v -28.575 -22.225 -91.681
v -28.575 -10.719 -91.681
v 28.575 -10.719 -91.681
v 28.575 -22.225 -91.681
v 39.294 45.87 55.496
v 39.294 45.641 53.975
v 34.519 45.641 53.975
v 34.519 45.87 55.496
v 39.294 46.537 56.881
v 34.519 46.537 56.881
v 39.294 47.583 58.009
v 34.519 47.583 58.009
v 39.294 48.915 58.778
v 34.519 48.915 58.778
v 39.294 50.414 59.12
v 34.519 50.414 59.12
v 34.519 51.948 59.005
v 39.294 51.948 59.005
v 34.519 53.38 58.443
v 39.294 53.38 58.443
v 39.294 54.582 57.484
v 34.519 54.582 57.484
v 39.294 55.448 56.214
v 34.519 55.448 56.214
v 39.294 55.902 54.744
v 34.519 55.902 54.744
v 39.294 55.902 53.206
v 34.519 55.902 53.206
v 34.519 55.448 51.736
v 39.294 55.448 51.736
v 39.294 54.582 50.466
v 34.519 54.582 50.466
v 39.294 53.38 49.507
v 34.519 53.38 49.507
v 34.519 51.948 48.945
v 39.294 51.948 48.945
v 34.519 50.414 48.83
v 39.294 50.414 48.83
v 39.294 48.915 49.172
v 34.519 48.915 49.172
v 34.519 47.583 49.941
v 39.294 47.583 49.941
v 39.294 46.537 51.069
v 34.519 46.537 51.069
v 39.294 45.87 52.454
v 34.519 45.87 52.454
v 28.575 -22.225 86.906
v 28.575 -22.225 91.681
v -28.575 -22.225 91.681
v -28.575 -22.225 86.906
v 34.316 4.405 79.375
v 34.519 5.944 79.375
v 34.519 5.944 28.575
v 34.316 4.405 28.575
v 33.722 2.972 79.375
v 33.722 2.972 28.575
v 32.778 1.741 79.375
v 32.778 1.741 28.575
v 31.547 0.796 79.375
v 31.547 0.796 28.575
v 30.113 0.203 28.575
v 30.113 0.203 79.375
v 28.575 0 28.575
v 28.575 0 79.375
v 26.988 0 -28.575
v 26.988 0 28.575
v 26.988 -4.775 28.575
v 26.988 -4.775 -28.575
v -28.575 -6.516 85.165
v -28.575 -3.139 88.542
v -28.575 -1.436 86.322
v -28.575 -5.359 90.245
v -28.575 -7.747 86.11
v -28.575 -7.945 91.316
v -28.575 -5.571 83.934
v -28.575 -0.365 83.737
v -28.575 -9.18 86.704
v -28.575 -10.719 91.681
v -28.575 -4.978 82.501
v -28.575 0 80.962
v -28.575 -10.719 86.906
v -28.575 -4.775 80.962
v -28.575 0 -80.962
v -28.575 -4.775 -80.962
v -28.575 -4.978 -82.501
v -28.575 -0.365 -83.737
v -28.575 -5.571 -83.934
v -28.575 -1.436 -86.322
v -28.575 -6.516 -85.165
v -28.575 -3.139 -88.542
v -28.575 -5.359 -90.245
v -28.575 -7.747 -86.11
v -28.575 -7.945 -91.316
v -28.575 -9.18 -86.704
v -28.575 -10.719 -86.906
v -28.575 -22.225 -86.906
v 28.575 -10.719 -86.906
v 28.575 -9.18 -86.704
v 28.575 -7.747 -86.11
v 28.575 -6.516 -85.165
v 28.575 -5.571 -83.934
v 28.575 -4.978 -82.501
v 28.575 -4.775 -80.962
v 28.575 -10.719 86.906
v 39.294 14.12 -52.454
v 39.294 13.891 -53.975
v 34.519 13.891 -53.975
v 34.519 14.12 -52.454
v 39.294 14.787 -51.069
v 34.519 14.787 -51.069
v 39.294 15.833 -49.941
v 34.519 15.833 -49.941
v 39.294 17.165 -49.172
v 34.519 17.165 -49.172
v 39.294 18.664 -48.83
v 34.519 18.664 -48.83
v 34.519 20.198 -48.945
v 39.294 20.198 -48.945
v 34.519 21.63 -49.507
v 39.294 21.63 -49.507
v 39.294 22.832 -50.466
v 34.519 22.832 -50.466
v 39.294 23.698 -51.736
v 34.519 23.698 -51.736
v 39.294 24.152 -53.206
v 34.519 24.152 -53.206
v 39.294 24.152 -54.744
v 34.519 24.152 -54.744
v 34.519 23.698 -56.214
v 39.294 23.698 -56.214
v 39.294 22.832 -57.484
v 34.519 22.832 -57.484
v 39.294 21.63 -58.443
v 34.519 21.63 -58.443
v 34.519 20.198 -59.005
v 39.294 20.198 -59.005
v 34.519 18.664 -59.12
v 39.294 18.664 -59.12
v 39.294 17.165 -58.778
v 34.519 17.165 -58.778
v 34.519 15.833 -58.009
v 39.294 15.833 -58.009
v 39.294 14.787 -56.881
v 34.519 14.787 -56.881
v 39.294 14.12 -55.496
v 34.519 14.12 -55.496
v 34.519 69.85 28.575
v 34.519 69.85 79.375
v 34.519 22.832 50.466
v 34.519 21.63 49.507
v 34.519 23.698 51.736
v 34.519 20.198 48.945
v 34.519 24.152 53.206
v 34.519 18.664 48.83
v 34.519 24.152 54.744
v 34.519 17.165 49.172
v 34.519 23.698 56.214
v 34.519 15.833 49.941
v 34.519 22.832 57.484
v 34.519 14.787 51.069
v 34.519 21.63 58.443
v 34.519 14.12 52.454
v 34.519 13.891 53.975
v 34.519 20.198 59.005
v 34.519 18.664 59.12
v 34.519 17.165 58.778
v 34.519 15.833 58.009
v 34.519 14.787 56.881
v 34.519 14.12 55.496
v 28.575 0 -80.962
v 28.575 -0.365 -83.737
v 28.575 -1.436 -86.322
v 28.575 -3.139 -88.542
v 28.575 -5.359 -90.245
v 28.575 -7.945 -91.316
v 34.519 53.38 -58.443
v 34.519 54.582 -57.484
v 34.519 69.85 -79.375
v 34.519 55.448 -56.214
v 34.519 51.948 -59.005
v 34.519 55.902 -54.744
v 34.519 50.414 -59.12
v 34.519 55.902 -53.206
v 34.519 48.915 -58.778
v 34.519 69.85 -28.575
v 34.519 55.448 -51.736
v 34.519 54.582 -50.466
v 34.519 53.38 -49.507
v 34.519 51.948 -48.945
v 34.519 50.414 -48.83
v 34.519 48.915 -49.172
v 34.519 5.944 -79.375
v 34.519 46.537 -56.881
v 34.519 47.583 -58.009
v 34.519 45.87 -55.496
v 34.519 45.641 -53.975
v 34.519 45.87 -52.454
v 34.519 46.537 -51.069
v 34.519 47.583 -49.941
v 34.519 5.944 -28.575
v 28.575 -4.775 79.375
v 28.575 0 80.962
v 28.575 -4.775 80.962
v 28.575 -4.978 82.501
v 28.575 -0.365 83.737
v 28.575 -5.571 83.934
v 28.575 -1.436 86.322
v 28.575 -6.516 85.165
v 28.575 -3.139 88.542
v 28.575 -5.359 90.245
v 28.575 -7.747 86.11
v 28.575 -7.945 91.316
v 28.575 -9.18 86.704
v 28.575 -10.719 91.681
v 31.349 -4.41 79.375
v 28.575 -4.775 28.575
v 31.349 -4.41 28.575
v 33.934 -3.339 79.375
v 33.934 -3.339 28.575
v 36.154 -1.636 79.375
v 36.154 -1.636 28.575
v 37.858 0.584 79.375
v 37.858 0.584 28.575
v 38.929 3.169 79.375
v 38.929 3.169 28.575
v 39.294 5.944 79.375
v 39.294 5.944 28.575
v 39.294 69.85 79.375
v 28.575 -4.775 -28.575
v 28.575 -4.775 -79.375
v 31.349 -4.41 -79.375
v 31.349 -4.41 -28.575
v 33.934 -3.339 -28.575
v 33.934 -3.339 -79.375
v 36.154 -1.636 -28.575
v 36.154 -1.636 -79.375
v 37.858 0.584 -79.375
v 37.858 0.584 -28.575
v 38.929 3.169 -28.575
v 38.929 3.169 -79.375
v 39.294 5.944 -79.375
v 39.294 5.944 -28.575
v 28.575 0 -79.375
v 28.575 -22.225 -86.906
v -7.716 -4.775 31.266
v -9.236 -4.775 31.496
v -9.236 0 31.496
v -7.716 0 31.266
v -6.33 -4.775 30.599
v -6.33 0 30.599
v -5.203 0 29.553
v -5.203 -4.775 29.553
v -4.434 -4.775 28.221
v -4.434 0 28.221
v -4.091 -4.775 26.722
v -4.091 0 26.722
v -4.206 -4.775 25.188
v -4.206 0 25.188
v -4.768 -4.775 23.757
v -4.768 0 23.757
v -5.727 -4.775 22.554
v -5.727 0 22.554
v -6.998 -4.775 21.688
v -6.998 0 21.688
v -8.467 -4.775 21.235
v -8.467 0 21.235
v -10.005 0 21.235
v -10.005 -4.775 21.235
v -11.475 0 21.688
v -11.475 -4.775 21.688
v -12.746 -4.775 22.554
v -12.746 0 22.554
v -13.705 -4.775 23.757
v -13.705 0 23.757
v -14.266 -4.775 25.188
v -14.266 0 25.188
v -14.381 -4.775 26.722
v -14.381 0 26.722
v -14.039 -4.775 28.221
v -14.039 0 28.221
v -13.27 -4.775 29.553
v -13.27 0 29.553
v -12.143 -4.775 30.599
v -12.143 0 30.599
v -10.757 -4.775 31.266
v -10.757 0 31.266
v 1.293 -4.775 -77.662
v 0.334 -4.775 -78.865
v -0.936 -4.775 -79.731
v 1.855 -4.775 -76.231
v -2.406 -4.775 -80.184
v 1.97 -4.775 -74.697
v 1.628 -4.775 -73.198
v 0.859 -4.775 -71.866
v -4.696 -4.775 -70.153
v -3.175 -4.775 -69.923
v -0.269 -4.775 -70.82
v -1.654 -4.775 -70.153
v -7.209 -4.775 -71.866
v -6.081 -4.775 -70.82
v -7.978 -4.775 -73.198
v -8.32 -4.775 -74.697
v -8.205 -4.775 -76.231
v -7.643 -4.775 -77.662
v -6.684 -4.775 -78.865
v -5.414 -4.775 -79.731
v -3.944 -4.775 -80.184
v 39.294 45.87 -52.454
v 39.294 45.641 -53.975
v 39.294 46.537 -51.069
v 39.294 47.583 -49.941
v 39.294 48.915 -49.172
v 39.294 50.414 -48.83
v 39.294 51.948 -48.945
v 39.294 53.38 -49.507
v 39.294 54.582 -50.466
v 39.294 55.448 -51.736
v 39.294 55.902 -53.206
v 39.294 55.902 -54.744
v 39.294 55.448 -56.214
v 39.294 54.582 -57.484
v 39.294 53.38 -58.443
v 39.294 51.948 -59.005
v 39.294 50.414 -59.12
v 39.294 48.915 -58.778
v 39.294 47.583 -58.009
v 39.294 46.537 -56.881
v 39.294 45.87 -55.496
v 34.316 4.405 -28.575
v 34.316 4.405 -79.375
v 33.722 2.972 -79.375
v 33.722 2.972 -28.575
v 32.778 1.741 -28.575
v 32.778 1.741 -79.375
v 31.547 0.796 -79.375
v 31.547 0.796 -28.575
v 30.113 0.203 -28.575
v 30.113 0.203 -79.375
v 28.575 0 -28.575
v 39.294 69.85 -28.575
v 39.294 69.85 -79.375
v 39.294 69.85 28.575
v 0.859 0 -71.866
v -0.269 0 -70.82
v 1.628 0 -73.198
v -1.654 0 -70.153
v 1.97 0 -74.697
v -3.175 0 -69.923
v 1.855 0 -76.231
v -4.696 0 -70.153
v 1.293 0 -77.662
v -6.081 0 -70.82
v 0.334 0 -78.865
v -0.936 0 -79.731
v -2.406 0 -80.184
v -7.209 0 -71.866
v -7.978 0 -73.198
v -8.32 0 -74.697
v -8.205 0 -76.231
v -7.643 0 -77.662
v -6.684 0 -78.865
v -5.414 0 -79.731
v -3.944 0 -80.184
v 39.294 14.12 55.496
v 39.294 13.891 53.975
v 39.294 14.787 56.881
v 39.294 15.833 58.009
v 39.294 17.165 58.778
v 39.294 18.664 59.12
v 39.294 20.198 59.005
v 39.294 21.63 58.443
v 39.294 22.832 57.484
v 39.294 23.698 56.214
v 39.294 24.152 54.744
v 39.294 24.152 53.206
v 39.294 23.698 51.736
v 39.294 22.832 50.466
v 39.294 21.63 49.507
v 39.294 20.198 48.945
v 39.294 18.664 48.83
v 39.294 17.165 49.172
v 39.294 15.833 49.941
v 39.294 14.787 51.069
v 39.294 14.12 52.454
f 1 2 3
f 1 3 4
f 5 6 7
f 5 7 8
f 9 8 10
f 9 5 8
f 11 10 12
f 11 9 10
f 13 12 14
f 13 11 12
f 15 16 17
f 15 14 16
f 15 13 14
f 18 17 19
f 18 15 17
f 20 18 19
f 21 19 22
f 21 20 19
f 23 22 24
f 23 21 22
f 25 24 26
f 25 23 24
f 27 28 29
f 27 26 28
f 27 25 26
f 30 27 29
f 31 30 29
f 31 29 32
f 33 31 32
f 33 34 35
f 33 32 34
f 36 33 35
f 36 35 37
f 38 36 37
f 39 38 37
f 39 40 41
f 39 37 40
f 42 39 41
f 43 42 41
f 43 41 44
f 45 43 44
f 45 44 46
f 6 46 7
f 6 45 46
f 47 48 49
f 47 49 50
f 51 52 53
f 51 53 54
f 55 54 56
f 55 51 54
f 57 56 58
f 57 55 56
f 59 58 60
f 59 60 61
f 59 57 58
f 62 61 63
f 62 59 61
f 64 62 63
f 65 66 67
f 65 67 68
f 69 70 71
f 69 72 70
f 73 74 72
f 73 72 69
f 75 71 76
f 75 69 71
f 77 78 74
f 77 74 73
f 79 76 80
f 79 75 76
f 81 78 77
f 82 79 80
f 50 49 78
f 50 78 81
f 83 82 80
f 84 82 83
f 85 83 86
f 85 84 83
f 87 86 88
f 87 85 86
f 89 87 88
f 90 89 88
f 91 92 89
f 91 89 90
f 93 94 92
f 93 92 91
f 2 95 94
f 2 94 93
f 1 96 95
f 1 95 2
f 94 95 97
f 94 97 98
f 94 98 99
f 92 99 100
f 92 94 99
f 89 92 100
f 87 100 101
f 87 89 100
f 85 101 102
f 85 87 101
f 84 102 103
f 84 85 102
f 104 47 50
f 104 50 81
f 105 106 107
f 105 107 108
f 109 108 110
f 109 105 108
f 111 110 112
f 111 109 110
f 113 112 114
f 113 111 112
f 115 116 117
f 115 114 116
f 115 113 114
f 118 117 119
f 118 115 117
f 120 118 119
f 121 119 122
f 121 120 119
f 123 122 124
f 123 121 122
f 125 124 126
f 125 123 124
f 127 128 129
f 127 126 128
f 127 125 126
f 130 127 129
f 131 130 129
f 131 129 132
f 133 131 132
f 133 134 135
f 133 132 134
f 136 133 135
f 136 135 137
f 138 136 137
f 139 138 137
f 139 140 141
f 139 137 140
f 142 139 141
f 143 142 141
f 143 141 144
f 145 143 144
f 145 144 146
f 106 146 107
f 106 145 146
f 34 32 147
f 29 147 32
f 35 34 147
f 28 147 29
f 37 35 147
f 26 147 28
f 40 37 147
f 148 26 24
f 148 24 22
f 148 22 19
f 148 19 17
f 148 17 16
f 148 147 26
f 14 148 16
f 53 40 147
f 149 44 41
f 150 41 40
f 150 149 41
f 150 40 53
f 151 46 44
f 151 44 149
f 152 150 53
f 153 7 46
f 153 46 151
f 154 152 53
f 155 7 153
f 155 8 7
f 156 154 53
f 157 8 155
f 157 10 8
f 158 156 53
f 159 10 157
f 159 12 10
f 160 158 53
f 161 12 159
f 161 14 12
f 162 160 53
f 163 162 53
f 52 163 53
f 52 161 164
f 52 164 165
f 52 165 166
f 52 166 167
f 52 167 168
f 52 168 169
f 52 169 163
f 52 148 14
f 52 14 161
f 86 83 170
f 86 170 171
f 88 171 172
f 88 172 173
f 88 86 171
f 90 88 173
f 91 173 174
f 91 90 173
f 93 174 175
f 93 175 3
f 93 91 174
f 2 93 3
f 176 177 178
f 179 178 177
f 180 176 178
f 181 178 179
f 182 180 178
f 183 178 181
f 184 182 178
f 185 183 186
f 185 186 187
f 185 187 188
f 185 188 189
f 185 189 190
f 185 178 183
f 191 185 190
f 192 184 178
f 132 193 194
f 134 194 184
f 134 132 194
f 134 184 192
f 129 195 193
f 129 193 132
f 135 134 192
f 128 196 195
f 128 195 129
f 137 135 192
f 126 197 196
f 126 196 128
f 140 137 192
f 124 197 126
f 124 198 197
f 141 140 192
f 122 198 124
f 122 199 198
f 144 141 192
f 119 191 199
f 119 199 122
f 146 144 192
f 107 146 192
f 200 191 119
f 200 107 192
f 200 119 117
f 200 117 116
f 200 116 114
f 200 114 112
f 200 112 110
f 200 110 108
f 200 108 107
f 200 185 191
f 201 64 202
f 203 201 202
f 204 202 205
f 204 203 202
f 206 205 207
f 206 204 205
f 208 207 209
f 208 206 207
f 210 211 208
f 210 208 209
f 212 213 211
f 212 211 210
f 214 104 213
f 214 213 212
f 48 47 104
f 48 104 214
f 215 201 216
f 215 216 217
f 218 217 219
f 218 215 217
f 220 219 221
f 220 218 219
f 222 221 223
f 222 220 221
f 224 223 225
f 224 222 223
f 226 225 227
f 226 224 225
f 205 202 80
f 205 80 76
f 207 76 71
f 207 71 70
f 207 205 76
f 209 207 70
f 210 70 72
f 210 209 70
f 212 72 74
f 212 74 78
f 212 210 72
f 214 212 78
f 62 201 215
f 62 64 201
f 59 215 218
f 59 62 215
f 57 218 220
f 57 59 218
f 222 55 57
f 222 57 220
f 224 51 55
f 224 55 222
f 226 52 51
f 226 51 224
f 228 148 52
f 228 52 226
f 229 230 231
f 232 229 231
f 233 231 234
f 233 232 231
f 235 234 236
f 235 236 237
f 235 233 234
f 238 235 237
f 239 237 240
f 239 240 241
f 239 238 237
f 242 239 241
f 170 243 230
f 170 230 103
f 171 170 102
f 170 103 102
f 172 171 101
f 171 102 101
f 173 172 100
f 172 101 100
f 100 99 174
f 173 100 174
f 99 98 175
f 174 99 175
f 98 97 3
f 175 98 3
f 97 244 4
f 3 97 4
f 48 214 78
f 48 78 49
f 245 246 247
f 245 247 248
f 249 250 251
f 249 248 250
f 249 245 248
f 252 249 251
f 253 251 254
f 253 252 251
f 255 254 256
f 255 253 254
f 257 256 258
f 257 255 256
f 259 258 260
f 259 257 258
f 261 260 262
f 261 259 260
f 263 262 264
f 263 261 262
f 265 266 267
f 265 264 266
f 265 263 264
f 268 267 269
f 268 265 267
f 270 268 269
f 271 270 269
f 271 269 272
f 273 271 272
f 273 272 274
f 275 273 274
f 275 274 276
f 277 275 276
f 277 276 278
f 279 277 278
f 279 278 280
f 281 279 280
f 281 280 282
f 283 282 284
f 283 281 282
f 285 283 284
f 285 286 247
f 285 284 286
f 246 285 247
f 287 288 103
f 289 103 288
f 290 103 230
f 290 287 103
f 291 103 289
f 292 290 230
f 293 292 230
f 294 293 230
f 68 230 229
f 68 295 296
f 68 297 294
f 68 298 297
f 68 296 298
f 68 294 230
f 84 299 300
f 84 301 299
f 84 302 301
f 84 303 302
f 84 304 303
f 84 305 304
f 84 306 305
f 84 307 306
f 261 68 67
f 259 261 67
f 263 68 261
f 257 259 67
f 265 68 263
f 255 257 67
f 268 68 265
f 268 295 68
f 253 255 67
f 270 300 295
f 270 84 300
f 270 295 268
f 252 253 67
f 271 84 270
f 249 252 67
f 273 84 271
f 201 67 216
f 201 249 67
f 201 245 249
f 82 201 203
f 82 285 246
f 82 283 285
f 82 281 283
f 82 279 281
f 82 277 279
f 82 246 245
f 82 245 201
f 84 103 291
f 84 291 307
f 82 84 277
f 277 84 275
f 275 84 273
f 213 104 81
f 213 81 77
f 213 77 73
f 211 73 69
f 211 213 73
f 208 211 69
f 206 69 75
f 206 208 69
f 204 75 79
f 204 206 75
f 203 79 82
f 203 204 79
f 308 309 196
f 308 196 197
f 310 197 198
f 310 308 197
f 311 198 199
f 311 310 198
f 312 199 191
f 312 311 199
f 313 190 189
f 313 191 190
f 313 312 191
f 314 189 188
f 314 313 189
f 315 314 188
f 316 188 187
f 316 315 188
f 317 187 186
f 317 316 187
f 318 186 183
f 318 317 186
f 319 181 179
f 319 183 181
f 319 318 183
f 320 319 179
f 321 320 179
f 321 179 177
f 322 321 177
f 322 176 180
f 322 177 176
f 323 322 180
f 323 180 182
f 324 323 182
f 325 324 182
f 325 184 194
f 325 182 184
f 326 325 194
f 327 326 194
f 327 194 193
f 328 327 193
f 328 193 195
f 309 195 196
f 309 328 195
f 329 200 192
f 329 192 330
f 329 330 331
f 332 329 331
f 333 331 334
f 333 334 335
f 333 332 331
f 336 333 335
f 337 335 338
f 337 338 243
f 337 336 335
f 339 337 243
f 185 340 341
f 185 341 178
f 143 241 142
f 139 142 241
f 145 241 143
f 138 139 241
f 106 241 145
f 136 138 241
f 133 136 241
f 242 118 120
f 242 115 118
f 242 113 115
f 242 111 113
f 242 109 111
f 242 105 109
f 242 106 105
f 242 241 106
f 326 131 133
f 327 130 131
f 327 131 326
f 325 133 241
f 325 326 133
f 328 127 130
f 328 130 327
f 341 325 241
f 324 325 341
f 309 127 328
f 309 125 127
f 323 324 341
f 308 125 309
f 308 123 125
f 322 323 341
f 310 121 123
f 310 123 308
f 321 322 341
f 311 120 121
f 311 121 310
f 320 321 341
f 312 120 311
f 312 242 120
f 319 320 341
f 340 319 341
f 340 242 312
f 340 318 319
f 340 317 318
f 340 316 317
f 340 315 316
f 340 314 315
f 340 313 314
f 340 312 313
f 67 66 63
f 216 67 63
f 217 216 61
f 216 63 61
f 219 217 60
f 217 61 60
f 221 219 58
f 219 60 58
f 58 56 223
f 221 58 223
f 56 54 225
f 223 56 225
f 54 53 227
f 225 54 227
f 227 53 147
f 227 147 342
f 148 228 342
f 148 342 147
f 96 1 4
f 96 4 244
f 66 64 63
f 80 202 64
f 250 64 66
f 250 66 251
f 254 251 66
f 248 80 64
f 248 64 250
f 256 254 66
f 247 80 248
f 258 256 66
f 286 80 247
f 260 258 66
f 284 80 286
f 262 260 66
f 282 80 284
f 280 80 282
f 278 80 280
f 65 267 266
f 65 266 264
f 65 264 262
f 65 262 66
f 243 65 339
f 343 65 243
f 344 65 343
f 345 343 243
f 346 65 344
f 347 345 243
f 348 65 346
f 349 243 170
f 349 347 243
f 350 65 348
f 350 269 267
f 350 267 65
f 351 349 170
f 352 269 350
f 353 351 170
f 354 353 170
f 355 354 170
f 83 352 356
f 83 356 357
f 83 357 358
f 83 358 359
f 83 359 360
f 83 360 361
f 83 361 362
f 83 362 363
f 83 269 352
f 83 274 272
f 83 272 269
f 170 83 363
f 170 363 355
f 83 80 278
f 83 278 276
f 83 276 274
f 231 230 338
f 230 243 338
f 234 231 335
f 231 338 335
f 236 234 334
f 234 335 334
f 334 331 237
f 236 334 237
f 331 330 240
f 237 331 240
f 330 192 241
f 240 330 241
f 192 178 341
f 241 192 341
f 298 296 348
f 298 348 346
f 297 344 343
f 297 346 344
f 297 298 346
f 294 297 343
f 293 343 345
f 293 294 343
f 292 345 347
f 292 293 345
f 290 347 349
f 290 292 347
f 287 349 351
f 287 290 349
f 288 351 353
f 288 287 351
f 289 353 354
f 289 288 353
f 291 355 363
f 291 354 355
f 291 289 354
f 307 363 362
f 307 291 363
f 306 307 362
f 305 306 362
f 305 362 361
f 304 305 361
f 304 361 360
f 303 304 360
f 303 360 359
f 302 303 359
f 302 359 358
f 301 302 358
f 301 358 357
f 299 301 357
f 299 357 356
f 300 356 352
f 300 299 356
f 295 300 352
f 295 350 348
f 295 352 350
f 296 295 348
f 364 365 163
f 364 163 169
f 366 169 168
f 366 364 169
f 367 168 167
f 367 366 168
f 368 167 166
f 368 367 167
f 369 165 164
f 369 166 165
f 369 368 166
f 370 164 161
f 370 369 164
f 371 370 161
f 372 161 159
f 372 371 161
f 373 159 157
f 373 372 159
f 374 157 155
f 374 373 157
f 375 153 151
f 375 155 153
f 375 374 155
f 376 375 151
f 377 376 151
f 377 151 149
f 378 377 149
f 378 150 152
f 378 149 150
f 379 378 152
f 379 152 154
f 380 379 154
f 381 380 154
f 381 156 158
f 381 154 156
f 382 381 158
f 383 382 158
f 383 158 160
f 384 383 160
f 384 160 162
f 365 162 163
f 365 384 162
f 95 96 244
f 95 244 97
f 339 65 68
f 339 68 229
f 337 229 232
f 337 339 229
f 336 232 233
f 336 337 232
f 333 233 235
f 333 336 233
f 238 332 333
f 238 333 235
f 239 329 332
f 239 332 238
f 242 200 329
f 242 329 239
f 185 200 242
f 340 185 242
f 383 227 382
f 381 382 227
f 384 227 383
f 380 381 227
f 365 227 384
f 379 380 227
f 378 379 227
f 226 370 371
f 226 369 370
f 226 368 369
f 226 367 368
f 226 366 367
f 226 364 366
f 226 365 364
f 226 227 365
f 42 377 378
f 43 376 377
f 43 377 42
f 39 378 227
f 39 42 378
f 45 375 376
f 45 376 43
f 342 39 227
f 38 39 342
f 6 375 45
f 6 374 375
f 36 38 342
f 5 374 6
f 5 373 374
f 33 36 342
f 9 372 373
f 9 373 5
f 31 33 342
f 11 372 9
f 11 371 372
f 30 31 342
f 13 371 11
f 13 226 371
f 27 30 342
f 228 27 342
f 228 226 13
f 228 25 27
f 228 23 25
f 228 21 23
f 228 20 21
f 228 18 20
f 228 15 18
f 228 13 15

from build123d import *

# Parameters (mm, degrees)
BASE_FLANGE1_DEPTH      = 4.7752
EDGE_FLANGE1_DEPTH      = 50.8
EDGE_FLANGE1_BEND_DEPTH = 50.8
EDGE_FLANGE2_DEPTH      = 57.15
EDGE_FLANGE2_BEND_DEPTH = 57.15
CUT_EXTRUDE1_DEPTH      = 132.397433882
CUT_EXTRUDE1_DEPTH_BACK = 132.397433882
SKETCH18_R              = 5.159375
CUT_EXTRUDE3_DEPTH      = 122.772271015
CUT_EXTRUDE3_DEPTH_BACK = 122.772271015
SKETCH20_R              = 5.159375


# Sheet-metal steps are written as plain solids
with BuildPart() as part:
    # Sketch1 → Base-Flange1 (new body)
    with BuildSketch(Plane(origin=(0, 0, 0), x_dir=(1, 0, 0), z_dir=(0, 1, 0))):
        Polygon((26.9875, -28.575), (26.9875, 28.575), (28.575, 28.575), (28.575, 79.375), (-28.575, 79.375), (-28.575, -79.375), (28.575, -79.375), (28.575, -28.575), align=None)
    extrude(amount=-BASE_FLANGE1_DEPTH)

    # Edge-Flange1 section (across the edge) → Edge-Flange1 (add)
    with BuildSketch(Plane(origin=(34.5186, 0, -28.575), x_dir=(-1, 0, 0), z_dir=(0, 0, -1))):
        with BuildLine():
            Line((-4.7752, 5.9436), (-4.7752, 69.85))
            Line((-4.7752, 69.85), (0, 69.85))
            Line((0, 69.85), (0, 5.9436))
            ThreePointArc((0, 5.9436), (1.740840135, 1.740840135), (5.9436, 0))
            Line((5.9436, 0), (5.9436, -4.7752))
            ThreePointArc((5.9436, -4.7752), (-1.635736166, -1.635736166), (-4.7752, 5.9436))
        make_face()
    extrude(amount=EDGE_FLANGE1_DEPTH)

    # Edge-Flange1 section 2 (across the edge) → Edge-Flange1 bend (add)
    with BuildSketch(Plane(origin=(34.5186, 0, 79.375), x_dir=(-1, 0, 0), z_dir=(0, 0, -1))):
        with BuildLine():
            Line((-4.7752, 5.9436), (-4.7752, 69.85))
            Line((-4.7752, 69.85), (0, 69.85))
            Line((0, 69.85), (0, 5.9436))
            ThreePointArc((0, 5.9436), (1.740840135, 1.740840135), (5.9436, 0))
            Line((5.9436, 0), (5.9436, -4.7752))
            ThreePointArc((5.9436, -4.7752), (-1.635736166, -1.635736166), (-4.7752, 5.9436))
        make_face()
    extrude(amount=EDGE_FLANGE1_BEND_DEPTH)

    # Edge-Flange2 section (across the edge) → Edge-Flange2 (add)
    with BuildSketch(Plane(origin=(28.575, -4.7752, 86.9061), x_dir=(0, 0, -1), z_dir=(-1, 0, 0))):
        with BuildLine():
            Line((-4.7752, 5.9436), (-4.7752, 17.4498))
            Line((-4.7752, 17.4498), (0, 17.4498))
            Line((0, 17.4498), (0, 5.9436))
            ThreePointArc((0, 5.9436), (1.740840135, 1.740840135), (5.9436, 0))
            Line((5.9436, 0), (7.5311, 0))
            Line((7.5311, 0), (7.5311, -4.7752))
            Line((7.5311, -4.7752), (5.9436, -4.7752))
            ThreePointArc((5.9436, -4.7752), (-1.635736166, -1.635736166), (-4.7752, 5.9436))
        make_face()
    extrude(amount=EDGE_FLANGE2_DEPTH)

    # Edge-Flange2 section 2 (across the edge) → Edge-Flange2 bend (add)
    with BuildSketch(Plane(origin=(-28.575, -4.7752, -86.9061), x_dir=(0, 0, 1), z_dir=(1, 0, 0))):
        with BuildLine():
            Line((-4.7752, 5.9436), (-4.7752, 17.4498))
            Line((-4.7752, 17.4498), (0, 17.4498))
            Line((0, 17.4498), (0, 5.9436))
            ThreePointArc((0, 5.9436), (1.740840135, 1.740840135), (5.9436, 0))
            Line((5.9436, 0), (7.5311, 0))
            Line((7.5311, 0), (7.5311, -4.7752))
            Line((7.5311, -4.7752), (5.9436, -4.7752))
            ThreePointArc((5.9436, -4.7752), (-1.635736166, -1.635736166), (-4.7752, 5.9436))
        make_face()
    extrude(amount=EDGE_FLANGE2_BEND_DEPTH)

    # Sketch18 → Cut-Extrude1 (cut, two sides: drawn at the far end of the back side and taken through both)
    with BuildSketch(Plane.ZY.offset(-34.5186).offset(-CUT_EXTRUDE1_DEPTH_BACK)):
        with Locations(Location((-53.975, 50.8, 0), (0, 0, 270))):
            Circle(SKETCH18_R)
        with Locations(Location((-53.975, 19.05, 0), (0, 0, 270))):
            Circle(SKETCH18_R)
        with Locations(Location((53.975, 50.8, 0), (0, 0, 270))):
            Circle(SKETCH18_R)
        with Locations(Location((53.975, 19.05, 0), (0, 0, 270))):
            Circle(SKETCH18_R)
    extrude(amount=CUT_EXTRUDE1_DEPTH + CUT_EXTRUDE1_DEPTH_BACK, mode=Mode.SUBTRACT)

    # Sketch20 → Cut-Extrude3 (cut, two sides: drawn at the far end of the back side and taken through both)
    with BuildSketch(Plane(origin=(0, 0, 0), x_dir=(1, 0, 0), z_dir=(0, 1, 0)).offset(-CUT_EXTRUDE3_DEPTH_BACK)):
        with Locations((-72.900583951, 79.249926239)):
            Circle(SKETCH20_R)
        with Locations(Location((-3.175, 75.082739816, 0), (0, 0, 270))):
            Circle(SKETCH20_R)
        with Locations(Location((-9.236362071, -26.336291386, 0), (0, 0, 270))):
            Circle(SKETCH20_R)
        with Locations((-78.961946022, -22.169104962)):
            Circle(SKETCH20_R)
    extrude(amount=CUT_EXTRUDE3_DEPTH + CUT_EXTRUDE3_DEPTH_BACK, mode=Mode.SUBTRACT)


solid = part.part
